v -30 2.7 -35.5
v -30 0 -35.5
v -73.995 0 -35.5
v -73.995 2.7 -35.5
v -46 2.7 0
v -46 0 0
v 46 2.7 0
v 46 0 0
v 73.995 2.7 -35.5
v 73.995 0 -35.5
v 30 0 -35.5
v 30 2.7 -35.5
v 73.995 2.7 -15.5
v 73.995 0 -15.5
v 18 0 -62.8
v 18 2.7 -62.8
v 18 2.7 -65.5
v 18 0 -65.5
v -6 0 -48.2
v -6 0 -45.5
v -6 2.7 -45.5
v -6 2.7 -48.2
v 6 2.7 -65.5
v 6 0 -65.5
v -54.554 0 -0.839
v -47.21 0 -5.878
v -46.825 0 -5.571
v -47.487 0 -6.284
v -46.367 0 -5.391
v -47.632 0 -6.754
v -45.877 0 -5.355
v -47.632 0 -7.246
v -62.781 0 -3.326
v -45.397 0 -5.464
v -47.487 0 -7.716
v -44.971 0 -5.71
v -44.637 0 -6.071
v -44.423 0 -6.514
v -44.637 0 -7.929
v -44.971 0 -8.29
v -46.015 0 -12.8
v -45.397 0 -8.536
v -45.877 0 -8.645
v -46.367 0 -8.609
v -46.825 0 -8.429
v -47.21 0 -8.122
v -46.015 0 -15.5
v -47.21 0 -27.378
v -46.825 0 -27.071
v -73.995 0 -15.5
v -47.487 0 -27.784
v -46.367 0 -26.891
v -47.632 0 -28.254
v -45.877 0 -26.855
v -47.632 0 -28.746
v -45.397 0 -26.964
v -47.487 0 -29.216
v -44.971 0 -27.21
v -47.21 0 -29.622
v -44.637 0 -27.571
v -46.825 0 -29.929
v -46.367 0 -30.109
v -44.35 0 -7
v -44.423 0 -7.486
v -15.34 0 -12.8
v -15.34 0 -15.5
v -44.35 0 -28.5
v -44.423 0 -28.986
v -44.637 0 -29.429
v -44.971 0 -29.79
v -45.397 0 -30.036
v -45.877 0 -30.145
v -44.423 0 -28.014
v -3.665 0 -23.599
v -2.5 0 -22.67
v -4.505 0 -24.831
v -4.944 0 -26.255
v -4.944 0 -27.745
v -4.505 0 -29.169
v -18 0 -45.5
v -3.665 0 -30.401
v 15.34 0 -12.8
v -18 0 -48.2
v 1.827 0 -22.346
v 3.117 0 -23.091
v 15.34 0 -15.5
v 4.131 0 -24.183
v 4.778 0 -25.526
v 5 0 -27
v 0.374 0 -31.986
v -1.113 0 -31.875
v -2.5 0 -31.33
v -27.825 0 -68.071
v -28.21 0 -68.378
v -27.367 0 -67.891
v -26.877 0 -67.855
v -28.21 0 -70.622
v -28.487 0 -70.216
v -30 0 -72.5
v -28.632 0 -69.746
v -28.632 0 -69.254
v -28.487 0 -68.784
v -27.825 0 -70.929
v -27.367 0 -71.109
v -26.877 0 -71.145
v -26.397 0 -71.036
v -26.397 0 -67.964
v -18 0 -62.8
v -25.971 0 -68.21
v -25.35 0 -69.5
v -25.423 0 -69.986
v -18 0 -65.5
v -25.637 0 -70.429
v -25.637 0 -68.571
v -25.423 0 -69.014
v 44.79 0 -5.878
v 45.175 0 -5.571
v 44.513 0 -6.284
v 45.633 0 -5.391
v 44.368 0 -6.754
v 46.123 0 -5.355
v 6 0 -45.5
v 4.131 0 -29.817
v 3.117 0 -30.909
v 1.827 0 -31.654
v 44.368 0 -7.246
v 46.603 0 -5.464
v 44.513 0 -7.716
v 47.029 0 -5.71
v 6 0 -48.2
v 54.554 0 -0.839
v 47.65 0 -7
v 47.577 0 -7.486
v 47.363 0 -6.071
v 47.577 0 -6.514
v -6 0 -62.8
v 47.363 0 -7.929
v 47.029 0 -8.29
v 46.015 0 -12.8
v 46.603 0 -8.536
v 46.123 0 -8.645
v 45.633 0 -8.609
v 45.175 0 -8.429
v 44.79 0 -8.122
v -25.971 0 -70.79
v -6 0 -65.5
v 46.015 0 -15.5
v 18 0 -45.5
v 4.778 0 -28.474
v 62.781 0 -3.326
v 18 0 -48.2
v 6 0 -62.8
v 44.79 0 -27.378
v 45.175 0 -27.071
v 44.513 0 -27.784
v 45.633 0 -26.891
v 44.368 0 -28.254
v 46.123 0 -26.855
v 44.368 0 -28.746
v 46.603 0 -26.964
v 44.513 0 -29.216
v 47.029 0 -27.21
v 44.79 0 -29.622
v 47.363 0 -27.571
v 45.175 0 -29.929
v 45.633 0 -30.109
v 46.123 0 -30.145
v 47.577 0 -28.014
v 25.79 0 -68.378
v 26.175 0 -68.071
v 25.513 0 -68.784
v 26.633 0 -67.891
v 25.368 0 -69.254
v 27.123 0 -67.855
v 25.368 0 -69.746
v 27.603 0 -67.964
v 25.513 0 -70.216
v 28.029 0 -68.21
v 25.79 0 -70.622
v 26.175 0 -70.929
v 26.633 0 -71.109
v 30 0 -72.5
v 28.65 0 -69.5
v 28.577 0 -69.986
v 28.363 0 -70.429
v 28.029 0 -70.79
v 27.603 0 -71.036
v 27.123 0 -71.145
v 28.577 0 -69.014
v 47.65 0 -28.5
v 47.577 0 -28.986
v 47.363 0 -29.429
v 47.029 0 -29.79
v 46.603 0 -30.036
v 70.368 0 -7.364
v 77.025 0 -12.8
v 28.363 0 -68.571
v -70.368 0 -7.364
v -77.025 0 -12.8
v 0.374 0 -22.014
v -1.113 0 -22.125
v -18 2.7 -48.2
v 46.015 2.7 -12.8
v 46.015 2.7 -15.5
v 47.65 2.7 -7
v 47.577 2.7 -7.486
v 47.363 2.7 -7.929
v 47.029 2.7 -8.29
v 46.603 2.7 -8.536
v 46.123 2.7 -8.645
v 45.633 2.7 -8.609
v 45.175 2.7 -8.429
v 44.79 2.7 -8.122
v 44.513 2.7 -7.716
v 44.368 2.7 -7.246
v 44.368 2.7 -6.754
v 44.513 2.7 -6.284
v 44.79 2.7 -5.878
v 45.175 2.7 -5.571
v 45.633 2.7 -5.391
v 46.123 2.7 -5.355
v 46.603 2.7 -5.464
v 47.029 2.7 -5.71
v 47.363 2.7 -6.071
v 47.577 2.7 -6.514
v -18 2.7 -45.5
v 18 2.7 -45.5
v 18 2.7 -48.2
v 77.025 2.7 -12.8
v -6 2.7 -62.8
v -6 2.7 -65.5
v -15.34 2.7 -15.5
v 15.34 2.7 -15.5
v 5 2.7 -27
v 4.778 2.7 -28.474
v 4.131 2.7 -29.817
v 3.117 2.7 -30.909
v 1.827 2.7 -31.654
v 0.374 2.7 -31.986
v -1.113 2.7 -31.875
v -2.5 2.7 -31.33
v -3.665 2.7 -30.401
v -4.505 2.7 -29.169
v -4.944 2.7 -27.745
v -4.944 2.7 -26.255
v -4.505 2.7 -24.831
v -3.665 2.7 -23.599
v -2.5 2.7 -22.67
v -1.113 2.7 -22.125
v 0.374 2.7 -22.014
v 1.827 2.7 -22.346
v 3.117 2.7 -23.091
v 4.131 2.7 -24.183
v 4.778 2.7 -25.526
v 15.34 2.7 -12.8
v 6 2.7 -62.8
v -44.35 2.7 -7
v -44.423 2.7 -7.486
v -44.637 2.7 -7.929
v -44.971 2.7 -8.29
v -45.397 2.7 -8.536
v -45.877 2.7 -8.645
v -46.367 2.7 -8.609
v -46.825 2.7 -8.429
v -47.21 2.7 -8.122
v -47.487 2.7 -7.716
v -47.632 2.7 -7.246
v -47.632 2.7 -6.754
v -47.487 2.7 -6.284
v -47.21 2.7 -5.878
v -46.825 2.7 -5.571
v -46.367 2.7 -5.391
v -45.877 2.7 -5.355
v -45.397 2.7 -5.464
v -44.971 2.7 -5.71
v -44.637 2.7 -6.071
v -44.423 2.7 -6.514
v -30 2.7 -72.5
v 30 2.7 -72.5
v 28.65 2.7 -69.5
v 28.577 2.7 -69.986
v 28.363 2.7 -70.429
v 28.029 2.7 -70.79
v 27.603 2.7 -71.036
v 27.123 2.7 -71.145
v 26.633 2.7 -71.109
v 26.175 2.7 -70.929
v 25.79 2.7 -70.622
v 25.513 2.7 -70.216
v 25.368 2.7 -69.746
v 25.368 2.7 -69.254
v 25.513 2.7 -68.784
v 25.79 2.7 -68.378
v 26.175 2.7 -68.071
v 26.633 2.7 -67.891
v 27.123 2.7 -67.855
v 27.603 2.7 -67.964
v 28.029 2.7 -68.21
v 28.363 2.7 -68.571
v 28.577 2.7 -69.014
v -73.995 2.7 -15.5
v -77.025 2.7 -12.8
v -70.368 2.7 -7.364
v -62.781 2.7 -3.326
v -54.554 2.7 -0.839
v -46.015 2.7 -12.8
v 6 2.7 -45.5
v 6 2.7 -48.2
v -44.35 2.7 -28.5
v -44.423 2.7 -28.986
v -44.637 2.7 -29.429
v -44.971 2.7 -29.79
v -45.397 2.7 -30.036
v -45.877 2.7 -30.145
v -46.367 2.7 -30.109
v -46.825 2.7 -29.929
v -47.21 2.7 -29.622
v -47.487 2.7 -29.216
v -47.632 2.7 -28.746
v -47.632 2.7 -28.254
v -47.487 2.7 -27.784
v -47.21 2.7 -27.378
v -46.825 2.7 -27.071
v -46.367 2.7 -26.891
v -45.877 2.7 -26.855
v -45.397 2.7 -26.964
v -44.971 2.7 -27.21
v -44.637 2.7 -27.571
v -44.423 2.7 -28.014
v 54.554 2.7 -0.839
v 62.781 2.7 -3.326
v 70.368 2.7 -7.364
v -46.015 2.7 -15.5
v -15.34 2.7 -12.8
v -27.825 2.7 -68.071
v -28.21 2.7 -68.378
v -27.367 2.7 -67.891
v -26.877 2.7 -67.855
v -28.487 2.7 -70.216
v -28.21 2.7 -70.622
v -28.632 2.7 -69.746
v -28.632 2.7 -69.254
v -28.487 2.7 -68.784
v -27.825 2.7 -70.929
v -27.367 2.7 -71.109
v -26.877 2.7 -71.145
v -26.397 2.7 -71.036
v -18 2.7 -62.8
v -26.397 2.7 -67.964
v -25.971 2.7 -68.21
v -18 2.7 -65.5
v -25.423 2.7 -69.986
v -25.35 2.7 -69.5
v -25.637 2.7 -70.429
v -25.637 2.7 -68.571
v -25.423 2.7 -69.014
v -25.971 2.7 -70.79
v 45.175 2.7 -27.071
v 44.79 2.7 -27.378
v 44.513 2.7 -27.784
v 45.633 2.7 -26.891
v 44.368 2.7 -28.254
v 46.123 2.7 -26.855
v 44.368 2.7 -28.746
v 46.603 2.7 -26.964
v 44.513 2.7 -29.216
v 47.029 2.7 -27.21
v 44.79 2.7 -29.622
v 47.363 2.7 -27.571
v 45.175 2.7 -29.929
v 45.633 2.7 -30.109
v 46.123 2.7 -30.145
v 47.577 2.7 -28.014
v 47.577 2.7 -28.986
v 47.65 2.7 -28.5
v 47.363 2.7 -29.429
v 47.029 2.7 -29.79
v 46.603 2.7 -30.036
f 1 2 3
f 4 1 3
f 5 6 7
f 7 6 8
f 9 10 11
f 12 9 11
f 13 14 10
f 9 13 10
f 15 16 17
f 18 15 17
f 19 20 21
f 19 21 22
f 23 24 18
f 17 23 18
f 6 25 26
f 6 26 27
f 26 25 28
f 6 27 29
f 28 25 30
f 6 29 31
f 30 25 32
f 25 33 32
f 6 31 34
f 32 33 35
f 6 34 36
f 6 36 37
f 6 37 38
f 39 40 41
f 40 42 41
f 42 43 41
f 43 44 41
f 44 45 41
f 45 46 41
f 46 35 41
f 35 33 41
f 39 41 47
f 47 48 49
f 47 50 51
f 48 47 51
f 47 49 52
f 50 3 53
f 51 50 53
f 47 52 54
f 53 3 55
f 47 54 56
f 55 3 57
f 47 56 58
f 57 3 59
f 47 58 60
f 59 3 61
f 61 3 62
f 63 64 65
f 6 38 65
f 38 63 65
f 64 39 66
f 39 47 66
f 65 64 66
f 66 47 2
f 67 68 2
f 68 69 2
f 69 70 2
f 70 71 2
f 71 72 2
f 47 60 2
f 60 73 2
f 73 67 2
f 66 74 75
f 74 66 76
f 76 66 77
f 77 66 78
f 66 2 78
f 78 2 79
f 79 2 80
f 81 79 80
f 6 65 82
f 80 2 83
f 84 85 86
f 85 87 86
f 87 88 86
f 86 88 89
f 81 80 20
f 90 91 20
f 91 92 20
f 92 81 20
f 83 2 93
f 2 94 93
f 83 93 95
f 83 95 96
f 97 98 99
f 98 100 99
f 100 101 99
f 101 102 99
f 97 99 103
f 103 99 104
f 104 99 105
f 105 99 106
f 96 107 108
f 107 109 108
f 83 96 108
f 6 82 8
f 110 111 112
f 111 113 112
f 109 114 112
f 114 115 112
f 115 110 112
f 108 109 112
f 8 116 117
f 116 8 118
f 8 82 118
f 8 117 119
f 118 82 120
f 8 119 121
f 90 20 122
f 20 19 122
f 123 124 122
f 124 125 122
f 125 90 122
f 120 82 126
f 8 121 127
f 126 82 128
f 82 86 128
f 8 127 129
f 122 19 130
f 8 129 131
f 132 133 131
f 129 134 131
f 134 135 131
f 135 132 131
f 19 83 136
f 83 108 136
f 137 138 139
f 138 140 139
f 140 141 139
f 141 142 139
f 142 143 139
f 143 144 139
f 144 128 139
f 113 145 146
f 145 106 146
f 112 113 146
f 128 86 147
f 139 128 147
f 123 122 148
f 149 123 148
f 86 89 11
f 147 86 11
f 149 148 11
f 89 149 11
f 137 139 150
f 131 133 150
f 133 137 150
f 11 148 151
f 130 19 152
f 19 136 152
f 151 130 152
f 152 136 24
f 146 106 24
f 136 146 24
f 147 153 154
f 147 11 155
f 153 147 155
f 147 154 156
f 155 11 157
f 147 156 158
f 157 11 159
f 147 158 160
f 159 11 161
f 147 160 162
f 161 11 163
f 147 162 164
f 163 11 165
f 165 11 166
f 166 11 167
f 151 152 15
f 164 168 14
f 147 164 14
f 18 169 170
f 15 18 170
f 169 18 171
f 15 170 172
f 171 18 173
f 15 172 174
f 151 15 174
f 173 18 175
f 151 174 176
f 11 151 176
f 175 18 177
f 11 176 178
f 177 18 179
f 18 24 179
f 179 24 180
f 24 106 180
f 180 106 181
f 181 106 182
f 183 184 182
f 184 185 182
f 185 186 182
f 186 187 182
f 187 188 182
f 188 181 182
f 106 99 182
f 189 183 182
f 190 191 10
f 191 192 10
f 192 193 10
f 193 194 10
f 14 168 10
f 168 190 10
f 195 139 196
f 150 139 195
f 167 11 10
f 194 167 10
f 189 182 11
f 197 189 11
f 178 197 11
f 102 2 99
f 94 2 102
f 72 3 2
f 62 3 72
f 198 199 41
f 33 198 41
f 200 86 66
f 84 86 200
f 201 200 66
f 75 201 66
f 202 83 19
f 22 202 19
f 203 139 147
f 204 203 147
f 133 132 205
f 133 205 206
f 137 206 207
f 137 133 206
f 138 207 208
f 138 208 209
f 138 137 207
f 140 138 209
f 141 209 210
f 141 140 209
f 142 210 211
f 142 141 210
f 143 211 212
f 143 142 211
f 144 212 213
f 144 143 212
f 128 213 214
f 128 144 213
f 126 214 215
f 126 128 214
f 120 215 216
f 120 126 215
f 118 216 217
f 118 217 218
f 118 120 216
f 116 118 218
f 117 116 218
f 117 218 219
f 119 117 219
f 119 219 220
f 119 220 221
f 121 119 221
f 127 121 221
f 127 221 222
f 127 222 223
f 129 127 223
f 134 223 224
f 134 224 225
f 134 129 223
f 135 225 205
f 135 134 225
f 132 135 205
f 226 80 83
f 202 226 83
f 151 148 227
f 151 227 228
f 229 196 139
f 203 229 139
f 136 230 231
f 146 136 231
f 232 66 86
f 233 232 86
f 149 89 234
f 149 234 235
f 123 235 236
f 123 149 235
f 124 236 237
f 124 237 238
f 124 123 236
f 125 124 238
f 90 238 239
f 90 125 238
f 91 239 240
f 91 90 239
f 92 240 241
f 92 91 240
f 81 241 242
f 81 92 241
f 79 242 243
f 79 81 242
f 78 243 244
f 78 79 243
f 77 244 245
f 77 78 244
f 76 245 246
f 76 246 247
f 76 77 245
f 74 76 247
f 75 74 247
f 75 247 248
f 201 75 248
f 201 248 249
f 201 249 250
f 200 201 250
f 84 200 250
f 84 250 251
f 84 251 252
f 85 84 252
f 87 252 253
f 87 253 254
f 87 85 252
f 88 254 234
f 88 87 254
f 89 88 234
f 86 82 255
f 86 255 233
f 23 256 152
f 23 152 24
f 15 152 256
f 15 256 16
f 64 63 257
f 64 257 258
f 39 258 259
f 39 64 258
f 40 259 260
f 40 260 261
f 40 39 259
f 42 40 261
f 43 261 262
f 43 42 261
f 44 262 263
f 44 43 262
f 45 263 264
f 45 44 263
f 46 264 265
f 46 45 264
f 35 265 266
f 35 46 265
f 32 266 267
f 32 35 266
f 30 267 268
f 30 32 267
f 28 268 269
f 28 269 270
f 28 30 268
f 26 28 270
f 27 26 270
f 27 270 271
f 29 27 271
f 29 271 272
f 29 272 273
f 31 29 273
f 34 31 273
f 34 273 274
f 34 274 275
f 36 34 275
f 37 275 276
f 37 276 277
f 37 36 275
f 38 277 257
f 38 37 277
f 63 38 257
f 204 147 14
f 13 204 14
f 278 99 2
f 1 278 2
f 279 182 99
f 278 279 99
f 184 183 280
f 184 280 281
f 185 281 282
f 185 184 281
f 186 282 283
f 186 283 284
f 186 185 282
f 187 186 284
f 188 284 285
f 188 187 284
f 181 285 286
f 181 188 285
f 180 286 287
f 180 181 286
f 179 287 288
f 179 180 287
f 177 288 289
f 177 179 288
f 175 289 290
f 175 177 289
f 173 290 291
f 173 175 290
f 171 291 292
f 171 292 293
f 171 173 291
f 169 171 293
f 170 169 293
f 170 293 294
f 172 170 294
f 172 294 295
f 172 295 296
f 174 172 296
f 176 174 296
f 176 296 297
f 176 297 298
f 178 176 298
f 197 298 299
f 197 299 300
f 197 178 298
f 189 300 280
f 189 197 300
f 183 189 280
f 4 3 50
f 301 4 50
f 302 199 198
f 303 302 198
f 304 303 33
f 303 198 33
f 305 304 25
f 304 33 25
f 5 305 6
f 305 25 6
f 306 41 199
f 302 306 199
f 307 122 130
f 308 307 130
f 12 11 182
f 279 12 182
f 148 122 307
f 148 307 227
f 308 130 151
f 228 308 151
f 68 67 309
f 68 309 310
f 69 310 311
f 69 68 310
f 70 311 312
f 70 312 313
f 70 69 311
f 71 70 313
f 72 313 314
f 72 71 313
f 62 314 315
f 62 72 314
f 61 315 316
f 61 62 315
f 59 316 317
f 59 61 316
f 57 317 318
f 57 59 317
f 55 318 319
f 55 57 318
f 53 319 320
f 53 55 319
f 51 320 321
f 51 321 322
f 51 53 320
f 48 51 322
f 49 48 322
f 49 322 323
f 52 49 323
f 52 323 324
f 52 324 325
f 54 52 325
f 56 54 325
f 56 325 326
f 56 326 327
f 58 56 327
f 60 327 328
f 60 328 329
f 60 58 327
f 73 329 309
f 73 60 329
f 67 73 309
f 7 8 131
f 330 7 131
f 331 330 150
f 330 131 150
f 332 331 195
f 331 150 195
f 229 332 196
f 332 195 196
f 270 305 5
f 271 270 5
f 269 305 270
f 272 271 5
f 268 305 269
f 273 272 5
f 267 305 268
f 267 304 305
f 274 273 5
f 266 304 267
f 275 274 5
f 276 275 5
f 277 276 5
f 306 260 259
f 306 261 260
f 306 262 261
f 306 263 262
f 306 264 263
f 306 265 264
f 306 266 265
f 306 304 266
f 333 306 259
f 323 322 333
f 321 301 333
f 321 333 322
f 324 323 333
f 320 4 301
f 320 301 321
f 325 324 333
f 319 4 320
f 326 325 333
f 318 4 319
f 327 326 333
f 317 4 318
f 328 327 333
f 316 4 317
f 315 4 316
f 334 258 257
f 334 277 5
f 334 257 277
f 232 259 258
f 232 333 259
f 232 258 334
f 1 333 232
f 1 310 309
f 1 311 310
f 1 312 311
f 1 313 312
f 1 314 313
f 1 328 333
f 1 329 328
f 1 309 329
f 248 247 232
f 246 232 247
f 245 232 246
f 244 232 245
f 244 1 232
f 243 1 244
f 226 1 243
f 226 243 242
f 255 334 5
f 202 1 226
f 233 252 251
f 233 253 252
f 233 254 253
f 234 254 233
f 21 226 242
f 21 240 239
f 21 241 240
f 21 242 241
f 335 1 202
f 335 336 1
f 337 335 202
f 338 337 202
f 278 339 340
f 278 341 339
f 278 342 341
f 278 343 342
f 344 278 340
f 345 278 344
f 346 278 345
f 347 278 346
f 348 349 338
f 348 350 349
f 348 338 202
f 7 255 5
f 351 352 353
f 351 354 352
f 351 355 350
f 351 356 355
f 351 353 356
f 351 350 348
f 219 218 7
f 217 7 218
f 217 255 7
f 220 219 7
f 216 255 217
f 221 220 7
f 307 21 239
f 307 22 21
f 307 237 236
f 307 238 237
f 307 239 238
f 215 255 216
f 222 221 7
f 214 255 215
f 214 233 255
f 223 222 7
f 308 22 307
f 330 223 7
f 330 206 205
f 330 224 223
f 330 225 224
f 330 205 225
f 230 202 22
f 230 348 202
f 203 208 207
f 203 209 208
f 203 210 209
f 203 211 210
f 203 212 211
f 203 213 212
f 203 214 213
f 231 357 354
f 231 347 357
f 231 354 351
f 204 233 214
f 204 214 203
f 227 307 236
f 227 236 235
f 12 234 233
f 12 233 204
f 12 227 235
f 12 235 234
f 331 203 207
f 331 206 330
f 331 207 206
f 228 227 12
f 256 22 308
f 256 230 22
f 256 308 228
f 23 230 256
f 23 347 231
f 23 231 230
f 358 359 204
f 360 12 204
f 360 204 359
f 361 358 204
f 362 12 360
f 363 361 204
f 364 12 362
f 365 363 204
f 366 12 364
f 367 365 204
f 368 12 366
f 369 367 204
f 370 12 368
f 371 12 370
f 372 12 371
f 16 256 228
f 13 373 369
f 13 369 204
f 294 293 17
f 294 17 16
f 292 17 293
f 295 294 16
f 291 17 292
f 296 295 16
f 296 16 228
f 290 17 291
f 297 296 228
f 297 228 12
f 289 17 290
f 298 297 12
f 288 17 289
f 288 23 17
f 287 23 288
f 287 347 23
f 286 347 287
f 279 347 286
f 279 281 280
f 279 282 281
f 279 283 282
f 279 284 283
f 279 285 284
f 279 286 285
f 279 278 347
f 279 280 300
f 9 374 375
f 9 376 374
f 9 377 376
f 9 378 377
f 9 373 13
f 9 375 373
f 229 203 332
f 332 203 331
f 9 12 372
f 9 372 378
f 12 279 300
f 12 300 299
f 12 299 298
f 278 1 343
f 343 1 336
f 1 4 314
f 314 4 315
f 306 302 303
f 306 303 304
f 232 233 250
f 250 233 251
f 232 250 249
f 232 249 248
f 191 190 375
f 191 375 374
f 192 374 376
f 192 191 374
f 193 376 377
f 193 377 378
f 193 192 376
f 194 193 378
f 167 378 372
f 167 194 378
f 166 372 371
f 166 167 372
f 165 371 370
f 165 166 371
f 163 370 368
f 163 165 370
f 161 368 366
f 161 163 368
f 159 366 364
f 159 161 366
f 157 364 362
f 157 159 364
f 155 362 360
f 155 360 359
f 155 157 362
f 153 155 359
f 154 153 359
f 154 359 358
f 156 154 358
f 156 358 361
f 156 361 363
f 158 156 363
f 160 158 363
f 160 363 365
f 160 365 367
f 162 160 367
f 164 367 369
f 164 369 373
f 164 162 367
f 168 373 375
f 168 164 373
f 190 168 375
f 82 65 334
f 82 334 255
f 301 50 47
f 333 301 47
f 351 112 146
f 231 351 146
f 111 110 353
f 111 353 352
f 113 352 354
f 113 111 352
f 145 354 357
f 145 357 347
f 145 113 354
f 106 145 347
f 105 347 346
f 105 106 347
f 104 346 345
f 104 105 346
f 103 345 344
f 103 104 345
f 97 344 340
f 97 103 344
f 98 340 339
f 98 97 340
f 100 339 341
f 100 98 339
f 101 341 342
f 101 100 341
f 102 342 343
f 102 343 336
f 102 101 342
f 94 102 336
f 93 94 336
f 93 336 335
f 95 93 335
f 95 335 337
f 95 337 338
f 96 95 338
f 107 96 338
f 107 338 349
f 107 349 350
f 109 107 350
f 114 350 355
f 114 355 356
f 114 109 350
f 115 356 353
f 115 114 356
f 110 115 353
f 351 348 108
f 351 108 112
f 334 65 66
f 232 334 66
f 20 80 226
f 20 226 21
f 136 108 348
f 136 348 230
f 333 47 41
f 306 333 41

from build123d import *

# Parameters (mm, degrees)
SKETCH1_R           = 1.65
SKETCH1_R_2         = 5
SKETCH1_W           = 30.68
SKETCH1_H           = 2.7
SKETCH1_W_2         = 12
BOSS_EXTRUDE1_DEPTH = 2.7


with BuildPart() as part:
    # Sketch1 → Boss-Extrude1 (new body)
    with BuildSketch(Plane(origin=(0, 0, 0), x_dir=(1, 0, 0), z_dir=(0, 1, 0))):
        with BuildLine():
            Line((-46, 0), (46, 0))
            ThreePointArc((46, 0), (62.780941571, 3.32568378), (77.025151087, 12.8))
            Line((77.025151087, 12.8), (46.015151087, 12.8))
            Line((46.015151087, 12.8), (46.015151087, 15.5))
            Line((46.015151087, 15.5), (73.995151087, 15.5))
            Line((73.995151087, 15.5), (73.995151087, 35.5))
            Line((73.995151087, 35.5), (30, 35.5))
            Line((30, 35.5), (30, 70.5))
            Line((30, 70.5), (30, 72.5))
            Line((30, 72.5), (-30, 72.5))
            Line((-30, 72.5), (-30, 70.5))
            Line((-30, 70.5), (-30, 35.5))
            Line((-30, 35.5), (-73.995151087, 35.5))
            Line((-73.995151087, 35.5), (-73.995151087, 15.5))
            Line((-73.995151087, 15.5), (-46.015151087, 15.5))
            Line((-46.015151087, 15.5), (-46.015151087, 12.8))
            Line((-46.015151087, 12.8), (-77.025151087, 12.8))
            ThreePointArc((-77.025151087, 12.8), (-62.780941571, 3.32568378), (-46, 0))
        make_face()
        with Locations((46, 28.5)):
            Circle(SKETCH1_R, mode=Mode.SUBTRACT)
        with Locations((46, 7)):
            Circle(SKETCH1_R, mode=Mode.SUBTRACT)
        with Locations((-46, 7)):
            Circle(SKETCH1_R, mode=Mode.SUBTRACT)
        with Locations((-46, 28.5)):
            Circle(SKETCH1_R, mode=Mode.SUBTRACT)
        with Locations((-27, 69.5)):
            Circle(SKETCH1_R, mode=Mode.SUBTRACT)
        with Locations((27, 69.5)):
            Circle(SKETCH1_R, mode=Mode.SUBTRACT)
        with Locations((0, 27)):
            Circle(SKETCH1_R_2, mode=Mode.SUBTRACT)
        with Locations((0, 14.15)):
            Rectangle(SKETCH1_W, SKETCH1_H, mode=Mode.SUBTRACT)
        with Locations((12, 46.85)):
            Rectangle(SKETCH1_W_2, SKETCH1_H, mode=Mode.SUBTRACT)
        with Locations((-12, 64.15)):
            Rectangle(SKETCH1_W_2, SKETCH1_H, mode=Mode.SUBTRACT)
        with Locations((12, 64.15)):
            Rectangle(SKETCH1_W_2, SKETCH1_H, mode=Mode.SUBTRACT)
        with Locations((-12, 46.85)):
            Rectangle(SKETCH1_W_2, SKETCH1_H, mode=Mode.SUBTRACT)
    extrude(amount=BOSS_EXTRUDE1_DEPTH)


solid = part.part
